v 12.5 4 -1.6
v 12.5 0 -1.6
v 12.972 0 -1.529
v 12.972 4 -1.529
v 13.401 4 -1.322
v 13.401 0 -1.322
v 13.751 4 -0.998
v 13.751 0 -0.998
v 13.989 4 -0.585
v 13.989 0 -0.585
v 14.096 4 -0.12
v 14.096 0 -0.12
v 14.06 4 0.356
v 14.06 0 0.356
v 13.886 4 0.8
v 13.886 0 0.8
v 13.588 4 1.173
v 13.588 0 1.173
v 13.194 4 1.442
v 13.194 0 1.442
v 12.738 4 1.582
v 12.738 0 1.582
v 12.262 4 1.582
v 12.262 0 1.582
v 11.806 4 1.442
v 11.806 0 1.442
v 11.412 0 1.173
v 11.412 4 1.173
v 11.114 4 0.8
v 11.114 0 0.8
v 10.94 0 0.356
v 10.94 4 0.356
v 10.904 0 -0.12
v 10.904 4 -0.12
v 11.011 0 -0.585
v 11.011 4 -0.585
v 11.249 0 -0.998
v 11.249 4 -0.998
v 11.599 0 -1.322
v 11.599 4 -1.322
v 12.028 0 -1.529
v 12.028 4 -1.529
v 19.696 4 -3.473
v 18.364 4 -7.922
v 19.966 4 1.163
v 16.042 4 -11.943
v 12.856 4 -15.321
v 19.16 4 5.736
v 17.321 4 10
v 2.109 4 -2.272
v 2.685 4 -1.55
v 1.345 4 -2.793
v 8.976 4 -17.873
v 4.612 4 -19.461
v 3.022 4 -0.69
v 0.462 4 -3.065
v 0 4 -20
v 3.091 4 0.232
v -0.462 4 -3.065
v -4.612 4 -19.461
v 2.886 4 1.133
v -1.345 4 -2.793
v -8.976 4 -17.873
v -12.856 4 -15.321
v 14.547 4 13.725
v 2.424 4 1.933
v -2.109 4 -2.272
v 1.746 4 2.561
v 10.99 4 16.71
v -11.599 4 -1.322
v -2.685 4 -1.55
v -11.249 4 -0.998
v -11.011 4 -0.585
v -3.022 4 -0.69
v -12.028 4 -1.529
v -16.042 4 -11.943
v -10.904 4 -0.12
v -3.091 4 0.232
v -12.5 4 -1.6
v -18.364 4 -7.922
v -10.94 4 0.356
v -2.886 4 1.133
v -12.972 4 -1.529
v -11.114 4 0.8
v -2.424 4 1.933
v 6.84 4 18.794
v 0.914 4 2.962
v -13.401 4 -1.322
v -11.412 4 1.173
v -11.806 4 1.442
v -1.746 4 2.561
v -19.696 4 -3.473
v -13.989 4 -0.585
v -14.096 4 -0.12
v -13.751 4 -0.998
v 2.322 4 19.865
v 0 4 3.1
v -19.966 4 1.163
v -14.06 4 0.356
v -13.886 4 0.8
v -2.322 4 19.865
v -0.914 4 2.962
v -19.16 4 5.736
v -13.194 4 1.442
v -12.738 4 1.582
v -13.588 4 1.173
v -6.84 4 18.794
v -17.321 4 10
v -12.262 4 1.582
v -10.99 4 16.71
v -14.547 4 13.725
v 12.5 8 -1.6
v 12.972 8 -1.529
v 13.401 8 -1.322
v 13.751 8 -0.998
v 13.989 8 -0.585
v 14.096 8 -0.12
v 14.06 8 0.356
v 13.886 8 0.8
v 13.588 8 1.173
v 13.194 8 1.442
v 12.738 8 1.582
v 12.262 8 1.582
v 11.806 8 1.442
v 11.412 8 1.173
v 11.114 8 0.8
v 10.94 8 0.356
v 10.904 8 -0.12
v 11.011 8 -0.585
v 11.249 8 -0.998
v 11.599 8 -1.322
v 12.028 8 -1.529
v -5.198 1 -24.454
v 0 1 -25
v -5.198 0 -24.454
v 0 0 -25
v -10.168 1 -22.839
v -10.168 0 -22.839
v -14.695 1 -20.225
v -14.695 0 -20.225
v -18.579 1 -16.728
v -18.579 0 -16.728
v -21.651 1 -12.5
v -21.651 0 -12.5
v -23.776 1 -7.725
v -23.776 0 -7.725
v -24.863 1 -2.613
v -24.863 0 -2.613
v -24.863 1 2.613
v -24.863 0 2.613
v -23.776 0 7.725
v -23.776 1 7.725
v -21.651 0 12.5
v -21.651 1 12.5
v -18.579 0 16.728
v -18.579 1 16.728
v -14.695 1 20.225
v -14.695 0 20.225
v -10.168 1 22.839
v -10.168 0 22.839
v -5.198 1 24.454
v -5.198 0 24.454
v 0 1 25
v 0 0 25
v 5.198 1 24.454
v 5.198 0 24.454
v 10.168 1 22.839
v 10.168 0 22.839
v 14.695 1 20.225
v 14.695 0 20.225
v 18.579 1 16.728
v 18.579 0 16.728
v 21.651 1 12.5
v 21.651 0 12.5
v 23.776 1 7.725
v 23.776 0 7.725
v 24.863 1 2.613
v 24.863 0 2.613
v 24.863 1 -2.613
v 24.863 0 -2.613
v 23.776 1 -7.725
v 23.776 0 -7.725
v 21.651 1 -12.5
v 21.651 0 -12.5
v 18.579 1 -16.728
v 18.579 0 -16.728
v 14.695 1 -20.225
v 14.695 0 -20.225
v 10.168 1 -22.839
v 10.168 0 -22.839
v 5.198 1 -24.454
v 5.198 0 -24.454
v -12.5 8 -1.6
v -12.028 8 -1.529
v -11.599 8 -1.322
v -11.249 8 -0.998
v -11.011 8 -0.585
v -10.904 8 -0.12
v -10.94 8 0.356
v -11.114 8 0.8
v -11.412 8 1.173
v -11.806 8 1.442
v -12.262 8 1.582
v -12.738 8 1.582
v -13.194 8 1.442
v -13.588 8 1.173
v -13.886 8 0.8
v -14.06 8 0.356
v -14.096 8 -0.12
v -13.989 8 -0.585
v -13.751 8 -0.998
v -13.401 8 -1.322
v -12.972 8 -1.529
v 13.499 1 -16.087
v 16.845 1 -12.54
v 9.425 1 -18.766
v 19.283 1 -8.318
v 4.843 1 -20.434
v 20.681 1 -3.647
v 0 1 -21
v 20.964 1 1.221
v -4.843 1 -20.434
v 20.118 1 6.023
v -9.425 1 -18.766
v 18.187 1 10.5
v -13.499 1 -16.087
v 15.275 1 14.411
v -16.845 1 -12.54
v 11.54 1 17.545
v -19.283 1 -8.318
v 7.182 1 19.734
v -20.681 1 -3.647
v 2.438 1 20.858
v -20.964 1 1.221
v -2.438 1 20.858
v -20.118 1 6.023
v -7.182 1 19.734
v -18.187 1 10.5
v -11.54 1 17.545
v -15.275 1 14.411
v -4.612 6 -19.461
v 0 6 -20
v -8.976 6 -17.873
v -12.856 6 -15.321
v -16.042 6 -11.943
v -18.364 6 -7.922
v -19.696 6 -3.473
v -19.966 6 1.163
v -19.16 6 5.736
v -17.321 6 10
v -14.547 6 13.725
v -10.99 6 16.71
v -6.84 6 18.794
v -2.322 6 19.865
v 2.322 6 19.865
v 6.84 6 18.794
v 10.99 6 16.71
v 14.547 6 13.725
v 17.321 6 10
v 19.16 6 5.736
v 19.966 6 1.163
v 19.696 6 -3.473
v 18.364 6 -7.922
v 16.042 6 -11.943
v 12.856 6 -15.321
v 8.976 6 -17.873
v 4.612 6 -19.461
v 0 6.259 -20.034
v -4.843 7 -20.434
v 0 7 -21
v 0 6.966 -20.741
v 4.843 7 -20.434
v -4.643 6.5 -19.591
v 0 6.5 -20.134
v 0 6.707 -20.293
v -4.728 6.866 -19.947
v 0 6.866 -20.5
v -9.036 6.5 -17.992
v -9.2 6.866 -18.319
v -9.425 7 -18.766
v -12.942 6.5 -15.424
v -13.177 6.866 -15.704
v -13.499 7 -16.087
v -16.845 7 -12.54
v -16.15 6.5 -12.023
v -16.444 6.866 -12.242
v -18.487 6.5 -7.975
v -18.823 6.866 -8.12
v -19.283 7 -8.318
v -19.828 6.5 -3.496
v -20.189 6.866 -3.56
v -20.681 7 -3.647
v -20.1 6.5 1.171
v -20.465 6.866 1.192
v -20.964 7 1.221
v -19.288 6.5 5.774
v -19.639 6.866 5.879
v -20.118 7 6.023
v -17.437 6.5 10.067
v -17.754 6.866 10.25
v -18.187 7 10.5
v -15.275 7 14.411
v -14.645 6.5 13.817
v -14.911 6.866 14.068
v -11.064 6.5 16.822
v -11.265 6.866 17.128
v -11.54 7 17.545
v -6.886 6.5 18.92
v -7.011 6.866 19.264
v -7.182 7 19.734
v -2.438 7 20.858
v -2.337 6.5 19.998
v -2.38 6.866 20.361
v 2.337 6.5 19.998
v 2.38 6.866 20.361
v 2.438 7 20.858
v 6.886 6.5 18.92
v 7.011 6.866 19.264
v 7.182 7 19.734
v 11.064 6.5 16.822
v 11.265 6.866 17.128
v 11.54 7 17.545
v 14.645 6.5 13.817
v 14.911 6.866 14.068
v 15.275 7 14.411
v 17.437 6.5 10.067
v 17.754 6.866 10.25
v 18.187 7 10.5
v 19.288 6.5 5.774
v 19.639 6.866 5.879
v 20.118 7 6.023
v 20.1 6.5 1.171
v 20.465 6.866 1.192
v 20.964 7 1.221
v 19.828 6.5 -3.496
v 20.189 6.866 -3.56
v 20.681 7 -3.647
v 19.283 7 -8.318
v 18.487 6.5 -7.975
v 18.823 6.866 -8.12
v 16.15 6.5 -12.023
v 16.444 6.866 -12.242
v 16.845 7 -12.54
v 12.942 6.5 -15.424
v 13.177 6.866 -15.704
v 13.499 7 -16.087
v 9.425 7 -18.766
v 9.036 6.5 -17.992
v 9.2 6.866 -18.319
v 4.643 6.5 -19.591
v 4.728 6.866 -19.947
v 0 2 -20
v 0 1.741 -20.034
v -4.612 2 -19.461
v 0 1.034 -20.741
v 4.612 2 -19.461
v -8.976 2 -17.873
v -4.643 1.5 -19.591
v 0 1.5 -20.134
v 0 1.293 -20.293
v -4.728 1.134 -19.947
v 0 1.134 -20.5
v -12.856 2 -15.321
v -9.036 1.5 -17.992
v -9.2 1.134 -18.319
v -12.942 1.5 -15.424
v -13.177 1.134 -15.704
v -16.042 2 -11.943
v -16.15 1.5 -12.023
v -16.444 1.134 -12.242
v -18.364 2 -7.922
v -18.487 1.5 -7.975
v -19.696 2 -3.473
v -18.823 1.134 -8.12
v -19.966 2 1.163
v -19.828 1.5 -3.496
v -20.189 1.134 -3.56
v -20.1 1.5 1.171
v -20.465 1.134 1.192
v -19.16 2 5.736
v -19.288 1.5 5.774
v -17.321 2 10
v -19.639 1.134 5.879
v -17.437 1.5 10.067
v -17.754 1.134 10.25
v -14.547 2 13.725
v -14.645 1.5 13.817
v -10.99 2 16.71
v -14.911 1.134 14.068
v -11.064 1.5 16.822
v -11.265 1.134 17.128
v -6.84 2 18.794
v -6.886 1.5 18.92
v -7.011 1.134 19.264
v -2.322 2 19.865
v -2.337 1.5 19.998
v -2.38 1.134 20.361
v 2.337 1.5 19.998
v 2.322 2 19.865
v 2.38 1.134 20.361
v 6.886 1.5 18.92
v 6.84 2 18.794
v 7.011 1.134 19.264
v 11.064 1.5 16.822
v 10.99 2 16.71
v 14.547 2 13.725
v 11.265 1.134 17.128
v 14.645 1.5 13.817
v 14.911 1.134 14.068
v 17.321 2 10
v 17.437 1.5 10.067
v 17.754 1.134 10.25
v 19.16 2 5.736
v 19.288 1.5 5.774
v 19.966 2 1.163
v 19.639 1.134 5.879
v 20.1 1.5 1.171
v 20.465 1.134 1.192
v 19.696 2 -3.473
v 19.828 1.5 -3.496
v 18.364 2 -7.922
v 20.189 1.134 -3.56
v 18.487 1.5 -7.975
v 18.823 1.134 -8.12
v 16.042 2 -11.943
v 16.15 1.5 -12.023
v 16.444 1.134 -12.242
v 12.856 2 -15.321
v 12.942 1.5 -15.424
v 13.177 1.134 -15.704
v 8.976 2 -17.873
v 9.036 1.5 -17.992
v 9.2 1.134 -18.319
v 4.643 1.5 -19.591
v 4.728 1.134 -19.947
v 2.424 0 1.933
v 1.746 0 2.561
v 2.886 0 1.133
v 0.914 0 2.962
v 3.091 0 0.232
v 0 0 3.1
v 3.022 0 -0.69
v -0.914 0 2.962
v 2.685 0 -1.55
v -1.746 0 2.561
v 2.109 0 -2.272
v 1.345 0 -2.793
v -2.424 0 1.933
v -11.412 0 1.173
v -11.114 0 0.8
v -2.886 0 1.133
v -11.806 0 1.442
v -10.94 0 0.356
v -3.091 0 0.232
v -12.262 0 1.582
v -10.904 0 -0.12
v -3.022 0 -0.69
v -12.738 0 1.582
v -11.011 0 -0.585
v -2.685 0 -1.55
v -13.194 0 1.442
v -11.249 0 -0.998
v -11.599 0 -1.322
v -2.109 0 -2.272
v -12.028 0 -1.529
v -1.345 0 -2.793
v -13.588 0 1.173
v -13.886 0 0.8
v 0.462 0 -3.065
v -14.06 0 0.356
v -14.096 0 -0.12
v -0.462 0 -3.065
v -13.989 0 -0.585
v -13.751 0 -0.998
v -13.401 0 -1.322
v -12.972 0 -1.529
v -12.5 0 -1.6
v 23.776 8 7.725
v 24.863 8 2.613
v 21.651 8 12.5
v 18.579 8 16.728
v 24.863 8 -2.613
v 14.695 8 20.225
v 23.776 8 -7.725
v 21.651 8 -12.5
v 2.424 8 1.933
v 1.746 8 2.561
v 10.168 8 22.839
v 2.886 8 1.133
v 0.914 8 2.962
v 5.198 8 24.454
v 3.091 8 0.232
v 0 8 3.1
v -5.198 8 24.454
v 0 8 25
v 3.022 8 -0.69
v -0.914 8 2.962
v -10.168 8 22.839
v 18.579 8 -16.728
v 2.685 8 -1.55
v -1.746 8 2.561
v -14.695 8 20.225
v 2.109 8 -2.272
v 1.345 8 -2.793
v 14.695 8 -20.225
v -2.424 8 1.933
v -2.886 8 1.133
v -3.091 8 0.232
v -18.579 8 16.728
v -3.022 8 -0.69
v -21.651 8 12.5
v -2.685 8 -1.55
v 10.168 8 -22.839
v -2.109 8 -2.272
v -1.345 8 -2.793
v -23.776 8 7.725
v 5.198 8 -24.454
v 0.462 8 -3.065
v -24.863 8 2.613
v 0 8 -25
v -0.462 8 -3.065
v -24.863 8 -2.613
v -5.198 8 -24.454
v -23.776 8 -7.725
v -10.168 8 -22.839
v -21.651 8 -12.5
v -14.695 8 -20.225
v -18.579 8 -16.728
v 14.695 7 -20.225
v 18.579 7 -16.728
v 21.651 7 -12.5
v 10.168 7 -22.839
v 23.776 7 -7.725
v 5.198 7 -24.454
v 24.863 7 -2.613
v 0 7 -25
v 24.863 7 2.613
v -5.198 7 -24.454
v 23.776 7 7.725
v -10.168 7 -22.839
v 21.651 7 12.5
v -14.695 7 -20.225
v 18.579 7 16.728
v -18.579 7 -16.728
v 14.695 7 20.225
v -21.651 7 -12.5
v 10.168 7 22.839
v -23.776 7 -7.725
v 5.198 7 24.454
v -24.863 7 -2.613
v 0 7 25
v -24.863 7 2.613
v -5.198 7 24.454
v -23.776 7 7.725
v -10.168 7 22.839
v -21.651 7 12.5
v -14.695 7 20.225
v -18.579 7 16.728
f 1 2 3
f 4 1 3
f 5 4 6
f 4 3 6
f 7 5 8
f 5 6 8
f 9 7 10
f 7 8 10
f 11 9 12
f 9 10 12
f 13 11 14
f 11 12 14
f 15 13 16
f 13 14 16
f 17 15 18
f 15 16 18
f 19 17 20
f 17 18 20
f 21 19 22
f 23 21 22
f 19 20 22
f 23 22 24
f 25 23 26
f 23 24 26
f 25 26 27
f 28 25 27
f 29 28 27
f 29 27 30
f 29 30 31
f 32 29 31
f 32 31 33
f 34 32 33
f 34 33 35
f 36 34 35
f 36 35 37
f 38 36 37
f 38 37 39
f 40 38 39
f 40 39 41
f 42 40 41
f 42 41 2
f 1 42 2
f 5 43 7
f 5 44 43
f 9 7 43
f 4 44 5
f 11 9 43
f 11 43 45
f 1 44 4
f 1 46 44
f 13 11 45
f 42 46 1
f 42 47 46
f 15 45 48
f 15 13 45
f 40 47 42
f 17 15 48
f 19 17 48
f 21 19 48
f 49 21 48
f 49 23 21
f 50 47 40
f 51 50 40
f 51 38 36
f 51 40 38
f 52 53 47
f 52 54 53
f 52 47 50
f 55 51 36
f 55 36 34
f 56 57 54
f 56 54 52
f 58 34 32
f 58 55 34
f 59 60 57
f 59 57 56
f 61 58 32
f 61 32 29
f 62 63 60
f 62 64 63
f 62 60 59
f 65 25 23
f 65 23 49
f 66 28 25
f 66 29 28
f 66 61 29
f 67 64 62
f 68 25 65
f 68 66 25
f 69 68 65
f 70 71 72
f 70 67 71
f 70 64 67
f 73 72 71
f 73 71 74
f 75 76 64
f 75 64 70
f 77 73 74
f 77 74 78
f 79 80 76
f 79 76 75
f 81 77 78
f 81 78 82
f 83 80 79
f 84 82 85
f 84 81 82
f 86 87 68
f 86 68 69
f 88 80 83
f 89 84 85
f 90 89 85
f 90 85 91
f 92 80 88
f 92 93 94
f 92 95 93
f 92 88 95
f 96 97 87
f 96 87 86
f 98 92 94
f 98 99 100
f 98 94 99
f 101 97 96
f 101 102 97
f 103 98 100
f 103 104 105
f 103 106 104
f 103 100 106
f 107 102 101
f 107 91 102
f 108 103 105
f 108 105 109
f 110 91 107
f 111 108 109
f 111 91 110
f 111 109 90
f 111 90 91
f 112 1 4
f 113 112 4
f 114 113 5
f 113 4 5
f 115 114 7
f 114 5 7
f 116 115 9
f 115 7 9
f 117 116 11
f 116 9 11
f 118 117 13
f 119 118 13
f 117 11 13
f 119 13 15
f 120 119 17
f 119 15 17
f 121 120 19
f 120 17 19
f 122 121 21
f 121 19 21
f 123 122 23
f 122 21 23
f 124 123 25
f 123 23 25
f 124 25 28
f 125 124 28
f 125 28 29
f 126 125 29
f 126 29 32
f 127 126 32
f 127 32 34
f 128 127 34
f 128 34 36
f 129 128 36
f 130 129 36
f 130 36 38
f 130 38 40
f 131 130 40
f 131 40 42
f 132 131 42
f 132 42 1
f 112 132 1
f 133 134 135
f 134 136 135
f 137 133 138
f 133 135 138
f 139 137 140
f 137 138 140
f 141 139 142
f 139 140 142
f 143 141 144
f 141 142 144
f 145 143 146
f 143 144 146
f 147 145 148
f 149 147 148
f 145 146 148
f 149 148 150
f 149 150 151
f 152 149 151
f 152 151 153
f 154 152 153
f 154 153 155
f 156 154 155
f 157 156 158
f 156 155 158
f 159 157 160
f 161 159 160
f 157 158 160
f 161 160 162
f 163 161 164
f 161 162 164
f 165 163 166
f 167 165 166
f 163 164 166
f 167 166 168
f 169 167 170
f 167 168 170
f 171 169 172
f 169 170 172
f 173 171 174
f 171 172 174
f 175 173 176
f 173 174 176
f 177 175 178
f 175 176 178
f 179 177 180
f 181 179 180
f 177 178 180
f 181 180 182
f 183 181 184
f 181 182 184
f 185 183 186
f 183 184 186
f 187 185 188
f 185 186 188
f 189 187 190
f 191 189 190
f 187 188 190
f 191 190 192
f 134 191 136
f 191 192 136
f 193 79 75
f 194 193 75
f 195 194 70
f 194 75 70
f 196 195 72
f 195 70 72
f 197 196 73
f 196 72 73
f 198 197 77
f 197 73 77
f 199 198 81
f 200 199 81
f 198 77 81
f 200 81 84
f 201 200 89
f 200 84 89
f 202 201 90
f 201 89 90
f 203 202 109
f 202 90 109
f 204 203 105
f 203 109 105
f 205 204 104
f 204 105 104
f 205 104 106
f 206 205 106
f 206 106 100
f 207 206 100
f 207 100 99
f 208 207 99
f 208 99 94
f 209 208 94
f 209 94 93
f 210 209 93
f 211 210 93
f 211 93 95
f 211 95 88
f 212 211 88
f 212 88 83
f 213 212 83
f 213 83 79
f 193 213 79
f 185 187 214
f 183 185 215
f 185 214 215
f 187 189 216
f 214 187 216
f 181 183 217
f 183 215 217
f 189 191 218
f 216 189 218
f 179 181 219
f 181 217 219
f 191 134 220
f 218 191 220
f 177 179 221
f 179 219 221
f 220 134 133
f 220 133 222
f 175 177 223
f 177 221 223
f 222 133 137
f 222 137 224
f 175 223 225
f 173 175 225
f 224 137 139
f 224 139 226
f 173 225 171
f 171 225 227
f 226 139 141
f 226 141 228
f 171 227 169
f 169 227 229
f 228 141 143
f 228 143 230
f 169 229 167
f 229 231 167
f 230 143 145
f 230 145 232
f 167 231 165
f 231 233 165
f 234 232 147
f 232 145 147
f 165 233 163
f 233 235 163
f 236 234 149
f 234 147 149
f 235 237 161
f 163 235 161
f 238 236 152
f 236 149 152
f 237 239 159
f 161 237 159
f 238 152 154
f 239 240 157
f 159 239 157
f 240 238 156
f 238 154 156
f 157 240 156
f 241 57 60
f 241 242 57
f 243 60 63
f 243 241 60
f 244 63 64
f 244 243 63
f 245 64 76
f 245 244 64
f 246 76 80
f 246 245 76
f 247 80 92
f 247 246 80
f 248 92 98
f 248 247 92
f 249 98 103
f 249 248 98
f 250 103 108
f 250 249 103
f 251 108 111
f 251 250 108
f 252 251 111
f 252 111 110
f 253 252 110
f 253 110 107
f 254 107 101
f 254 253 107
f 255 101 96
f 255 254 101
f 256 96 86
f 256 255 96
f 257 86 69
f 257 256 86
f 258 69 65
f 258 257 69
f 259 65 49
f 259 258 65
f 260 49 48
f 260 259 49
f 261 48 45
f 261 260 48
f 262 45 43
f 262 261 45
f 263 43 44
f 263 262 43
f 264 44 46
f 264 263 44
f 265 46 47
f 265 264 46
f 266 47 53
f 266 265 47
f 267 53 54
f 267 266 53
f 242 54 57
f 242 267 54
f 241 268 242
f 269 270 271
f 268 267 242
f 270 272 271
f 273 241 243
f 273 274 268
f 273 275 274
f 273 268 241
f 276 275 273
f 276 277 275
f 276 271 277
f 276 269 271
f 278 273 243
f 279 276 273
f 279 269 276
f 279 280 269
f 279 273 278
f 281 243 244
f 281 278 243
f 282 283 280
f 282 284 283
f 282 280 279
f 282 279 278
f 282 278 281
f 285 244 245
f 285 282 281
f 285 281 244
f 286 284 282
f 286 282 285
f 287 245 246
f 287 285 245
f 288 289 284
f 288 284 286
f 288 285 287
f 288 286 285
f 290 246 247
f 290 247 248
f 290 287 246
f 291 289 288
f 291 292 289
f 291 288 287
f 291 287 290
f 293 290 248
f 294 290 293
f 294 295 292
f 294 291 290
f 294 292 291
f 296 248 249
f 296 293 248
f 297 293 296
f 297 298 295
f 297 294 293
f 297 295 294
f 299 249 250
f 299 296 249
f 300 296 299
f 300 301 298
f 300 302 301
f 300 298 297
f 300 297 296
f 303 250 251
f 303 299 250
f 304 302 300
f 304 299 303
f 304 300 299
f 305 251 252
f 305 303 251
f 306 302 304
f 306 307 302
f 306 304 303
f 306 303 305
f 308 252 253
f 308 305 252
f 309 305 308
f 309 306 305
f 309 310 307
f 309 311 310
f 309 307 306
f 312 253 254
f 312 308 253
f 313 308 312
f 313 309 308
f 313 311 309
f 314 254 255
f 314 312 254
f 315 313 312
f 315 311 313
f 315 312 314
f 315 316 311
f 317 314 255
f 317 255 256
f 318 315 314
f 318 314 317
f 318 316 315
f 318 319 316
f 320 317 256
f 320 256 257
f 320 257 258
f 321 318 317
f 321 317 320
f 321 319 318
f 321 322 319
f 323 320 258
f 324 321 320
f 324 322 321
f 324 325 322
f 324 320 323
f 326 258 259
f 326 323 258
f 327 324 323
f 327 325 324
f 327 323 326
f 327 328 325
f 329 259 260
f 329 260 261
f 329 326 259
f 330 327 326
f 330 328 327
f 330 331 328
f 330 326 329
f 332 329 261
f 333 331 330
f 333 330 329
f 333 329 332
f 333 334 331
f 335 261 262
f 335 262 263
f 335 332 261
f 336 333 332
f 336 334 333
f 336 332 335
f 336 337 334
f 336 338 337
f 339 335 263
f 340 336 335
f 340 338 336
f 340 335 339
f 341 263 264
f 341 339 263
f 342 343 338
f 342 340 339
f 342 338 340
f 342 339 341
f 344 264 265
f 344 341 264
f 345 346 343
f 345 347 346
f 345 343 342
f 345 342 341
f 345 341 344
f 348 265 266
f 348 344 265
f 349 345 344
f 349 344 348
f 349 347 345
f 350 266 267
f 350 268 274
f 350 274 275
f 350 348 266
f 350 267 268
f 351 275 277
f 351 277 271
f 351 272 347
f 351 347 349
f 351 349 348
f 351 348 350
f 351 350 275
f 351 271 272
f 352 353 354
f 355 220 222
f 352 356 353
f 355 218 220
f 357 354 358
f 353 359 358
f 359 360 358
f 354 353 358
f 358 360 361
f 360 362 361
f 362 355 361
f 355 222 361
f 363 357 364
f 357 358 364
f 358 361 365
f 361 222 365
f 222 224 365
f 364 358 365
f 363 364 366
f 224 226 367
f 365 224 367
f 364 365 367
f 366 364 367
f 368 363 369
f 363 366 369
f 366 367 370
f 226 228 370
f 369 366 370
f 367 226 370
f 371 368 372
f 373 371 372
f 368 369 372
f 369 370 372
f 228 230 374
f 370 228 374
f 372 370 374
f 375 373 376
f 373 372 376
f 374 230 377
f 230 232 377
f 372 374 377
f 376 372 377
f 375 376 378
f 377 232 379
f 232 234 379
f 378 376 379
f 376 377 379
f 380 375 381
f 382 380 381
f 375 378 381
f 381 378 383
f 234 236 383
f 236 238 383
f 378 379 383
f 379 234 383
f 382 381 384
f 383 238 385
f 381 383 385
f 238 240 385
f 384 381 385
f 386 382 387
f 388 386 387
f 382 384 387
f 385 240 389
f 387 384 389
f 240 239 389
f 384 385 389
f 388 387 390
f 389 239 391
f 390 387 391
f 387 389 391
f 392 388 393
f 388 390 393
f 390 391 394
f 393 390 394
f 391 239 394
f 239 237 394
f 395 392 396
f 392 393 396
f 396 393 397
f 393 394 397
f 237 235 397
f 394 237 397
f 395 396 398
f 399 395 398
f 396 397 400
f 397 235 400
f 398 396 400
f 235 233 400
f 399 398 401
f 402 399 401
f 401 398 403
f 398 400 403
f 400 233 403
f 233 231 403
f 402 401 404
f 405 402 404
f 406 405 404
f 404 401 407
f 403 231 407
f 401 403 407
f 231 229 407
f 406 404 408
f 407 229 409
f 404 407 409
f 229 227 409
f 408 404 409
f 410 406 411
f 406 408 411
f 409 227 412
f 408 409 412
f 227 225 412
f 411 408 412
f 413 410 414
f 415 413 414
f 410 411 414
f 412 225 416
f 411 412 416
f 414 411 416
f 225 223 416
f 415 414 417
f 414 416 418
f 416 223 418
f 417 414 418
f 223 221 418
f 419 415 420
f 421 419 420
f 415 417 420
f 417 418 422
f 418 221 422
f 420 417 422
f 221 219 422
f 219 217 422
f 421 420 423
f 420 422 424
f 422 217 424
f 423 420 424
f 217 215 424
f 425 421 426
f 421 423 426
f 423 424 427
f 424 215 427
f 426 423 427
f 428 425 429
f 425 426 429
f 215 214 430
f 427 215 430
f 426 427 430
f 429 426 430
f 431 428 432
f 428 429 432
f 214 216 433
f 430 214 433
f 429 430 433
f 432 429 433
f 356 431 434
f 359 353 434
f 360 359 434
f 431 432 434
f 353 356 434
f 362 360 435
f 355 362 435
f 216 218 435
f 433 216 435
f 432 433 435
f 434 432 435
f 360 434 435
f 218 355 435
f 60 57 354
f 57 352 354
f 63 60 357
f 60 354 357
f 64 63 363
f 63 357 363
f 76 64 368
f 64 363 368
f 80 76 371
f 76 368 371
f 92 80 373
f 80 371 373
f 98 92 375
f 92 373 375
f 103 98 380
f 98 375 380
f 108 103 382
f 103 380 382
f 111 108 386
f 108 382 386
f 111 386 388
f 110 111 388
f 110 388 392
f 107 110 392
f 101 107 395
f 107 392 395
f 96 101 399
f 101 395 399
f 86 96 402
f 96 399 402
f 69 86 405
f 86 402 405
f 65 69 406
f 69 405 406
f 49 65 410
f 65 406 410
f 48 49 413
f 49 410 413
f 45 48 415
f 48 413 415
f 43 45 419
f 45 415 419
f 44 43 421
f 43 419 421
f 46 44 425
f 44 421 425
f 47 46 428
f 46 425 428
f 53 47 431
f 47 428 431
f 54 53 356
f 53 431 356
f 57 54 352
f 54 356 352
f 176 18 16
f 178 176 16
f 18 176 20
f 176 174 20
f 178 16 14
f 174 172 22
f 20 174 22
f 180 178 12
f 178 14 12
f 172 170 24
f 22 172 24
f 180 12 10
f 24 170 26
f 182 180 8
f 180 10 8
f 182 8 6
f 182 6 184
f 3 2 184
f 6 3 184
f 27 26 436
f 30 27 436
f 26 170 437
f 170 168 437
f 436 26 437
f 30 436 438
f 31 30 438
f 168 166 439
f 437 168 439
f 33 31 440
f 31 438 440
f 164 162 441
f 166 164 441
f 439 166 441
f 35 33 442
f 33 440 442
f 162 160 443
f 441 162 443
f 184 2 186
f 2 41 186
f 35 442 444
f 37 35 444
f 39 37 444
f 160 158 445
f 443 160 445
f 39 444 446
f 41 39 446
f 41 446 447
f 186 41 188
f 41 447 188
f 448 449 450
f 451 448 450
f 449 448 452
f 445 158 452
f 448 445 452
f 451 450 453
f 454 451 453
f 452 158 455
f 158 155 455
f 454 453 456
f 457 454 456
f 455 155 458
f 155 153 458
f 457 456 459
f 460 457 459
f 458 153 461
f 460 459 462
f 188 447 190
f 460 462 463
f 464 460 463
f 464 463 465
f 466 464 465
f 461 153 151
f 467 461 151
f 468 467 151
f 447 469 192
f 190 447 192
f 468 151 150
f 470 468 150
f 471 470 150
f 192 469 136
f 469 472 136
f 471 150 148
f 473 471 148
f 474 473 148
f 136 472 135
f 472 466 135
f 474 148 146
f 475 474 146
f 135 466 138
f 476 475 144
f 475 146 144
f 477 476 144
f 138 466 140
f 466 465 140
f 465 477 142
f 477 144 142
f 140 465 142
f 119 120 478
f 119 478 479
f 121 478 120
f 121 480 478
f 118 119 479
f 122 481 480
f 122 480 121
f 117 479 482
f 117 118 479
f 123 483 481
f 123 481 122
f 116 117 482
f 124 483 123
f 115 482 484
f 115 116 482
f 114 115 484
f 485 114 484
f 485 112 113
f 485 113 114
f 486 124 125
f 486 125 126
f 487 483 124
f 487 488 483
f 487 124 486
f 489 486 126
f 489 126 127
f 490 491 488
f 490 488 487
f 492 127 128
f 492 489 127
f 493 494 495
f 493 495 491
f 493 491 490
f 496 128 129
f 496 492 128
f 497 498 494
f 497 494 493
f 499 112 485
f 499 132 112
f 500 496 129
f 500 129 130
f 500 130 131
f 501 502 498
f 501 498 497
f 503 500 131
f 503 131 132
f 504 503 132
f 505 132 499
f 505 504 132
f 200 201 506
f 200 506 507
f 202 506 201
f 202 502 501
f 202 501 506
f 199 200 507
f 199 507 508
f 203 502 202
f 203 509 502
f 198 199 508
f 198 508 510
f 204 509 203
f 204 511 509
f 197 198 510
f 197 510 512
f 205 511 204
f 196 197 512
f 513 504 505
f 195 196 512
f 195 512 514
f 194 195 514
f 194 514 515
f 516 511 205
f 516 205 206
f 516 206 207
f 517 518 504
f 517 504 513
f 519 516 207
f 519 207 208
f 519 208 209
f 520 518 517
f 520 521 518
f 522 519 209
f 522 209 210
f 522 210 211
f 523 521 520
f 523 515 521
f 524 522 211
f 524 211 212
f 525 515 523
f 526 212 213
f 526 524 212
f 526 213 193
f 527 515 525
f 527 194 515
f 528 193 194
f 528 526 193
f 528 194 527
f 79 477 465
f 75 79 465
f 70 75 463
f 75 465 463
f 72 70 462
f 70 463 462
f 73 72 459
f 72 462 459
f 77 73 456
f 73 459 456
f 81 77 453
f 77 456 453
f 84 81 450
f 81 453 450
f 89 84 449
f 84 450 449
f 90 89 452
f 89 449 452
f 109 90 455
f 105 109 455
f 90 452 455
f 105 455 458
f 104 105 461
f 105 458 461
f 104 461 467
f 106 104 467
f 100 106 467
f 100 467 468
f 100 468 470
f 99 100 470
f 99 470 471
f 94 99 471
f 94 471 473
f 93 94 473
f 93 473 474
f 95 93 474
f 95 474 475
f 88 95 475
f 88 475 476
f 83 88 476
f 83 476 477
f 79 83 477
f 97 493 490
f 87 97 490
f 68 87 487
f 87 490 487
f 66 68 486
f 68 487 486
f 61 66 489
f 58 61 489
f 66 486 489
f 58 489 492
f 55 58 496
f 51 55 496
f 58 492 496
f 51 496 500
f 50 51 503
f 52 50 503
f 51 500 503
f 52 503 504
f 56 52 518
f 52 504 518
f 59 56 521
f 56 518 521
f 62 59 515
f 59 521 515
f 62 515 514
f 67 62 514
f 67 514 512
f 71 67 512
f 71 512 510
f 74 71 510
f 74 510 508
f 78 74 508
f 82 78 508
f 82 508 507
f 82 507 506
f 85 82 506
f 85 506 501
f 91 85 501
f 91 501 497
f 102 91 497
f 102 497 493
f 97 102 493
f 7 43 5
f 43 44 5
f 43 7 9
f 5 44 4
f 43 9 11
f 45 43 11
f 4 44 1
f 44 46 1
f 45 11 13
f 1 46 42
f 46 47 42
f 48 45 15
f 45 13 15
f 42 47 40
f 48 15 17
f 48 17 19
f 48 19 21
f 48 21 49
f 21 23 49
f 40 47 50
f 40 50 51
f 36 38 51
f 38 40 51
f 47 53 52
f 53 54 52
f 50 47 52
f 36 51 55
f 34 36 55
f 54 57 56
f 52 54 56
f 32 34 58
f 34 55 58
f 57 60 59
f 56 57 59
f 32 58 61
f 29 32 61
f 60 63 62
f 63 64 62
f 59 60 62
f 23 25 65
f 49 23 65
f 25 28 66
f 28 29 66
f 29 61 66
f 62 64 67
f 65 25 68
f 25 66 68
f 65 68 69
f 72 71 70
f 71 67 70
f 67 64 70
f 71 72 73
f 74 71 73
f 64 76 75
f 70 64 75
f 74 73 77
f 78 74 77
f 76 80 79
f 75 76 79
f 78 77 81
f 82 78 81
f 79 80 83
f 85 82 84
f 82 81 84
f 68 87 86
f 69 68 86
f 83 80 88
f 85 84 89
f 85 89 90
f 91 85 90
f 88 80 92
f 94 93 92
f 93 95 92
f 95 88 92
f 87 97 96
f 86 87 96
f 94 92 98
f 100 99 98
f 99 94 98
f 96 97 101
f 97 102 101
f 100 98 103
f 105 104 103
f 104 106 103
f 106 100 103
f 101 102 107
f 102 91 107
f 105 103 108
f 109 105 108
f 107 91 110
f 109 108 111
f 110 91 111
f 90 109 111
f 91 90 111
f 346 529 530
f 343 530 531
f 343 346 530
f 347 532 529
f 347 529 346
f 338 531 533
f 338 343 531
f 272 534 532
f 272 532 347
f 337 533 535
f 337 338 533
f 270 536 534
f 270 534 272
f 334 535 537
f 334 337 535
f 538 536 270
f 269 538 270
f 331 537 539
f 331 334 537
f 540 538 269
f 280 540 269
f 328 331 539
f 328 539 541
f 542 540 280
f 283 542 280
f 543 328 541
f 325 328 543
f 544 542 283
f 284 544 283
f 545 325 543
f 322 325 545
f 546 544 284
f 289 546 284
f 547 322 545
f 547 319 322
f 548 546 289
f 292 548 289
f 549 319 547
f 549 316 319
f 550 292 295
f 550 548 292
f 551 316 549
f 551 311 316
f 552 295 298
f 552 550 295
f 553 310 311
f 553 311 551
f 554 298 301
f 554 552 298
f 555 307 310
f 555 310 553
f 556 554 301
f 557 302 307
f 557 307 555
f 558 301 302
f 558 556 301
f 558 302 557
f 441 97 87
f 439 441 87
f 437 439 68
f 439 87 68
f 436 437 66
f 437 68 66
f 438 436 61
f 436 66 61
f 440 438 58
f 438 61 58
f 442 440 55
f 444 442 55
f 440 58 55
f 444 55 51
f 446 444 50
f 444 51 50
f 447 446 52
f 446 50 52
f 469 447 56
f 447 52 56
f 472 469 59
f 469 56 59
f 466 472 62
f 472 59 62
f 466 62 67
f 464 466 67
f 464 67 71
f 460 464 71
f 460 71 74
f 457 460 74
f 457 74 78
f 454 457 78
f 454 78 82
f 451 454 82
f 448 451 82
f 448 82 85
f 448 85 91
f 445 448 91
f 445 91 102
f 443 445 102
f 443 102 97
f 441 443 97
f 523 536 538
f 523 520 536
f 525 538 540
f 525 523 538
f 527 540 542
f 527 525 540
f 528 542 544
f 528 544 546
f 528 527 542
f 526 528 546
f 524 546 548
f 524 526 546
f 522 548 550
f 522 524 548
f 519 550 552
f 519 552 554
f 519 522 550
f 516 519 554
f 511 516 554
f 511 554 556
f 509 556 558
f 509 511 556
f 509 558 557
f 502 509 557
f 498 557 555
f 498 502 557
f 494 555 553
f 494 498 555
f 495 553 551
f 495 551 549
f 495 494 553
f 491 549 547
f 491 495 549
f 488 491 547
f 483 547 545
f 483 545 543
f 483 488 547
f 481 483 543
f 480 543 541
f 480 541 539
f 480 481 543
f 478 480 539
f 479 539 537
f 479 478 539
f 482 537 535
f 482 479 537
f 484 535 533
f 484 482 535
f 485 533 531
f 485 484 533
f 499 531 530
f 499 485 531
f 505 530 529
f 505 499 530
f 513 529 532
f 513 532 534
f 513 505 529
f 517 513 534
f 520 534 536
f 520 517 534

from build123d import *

# Parameters (mm, degrees)
SKETCH_2_R          = 3.1
CUT_EXTRUDE_1_DEPTH = 37.249137921
SKETCH_3_R          = 1.6
CUT_EXTRUDE_2_DEPTH = 37.249137921


with BuildPart() as part:
    # ｽｹｯﾁ1 → 回転1 (revolve)
    with BuildSketch(Plane.XY, mode=Mode.PRIVATE) as revolve_1_sk:
        with BuildLine():
            Line((0, 0), (0, 4))
            Line((0, 4), (20, 4))
            Line((20, 4), (20, 2))
            ThreePointArc((20, 2), (20.292893219, 1.292893219), (21, 1))
            Line((21, 1), (25, 1))
            Line((25, 1), (25, 0))
            Line((25, 0), (0, 0))
        make_face()
    revolve(revolve_1_sk.sketch.rotate(Axis((0, 0, 0), (0, 1, 0)), 90), axis=Axis((0, 0, 0), (0, 1, 0)))


with BuildPart() as body_2:
    # ﾐﾗｰ1: mirrored copy
    add(part.part.mirror(Plane.ZX.offset(4)))


with BuildPart() as cut_extrude_1_tool:
    # ｽｹｯﾁ2 → ｶｯﾄ - 押し出し1 (new, through all)
    with BuildSketch(Plane(origin=(0, 8, 0), x_dir=(1, 0, 0), z_dir=(0, 1, 0))):
        with Locations(Location((0, 0, 0), (0, 0, 270))):
            Circle(SKETCH_2_R)
    extrude(amount=-CUT_EXTRUDE_1_DEPTH)


with BuildPart() as part_1:
    add(part.part)

    # ｶｯﾄ - 押し出し1: cut by cut_extrude_1_tool
    add(cut_extrude_1_tool.part, mode=Mode.SUBTRACT)


with BuildPart() as body_2_1:
    add(body_2.part)

    # ｶｯﾄ - 押し出し1: cut by cut_extrude_1_tool
    add(cut_extrude_1_tool.part, mode=Mode.SUBTRACT)


with BuildPart() as cut_extrude_2_tool:
    # ｽｹｯﾁ3 → ｶｯﾄ - 押し出し2 (new, through all)
    with BuildSketch(Plane.XZ):
        with Locations(Location((12.5, 0, 0), (0, 0, 270))):
            Circle(SKETCH_3_R)
        with Locations(Location((-12.5, 0, 0), (0, 0, 270))):
            Circle(SKETCH_3_R)
    extrude(amount=-CUT_EXTRUDE_2_DEPTH)


with BuildPart() as part_2:
    add(part_1.part)

    # ｶｯﾄ - 押し出し2: cut by cut_extrude_2_tool
    add(cut_extrude_2_tool.part, mode=Mode.SUBTRACT)


with BuildPart() as body_2_2:
    add(body_2_1.part)

    # ｶｯﾄ - 押し出し2: cut by cut_extrude_2_tool
    add(cut_extrude_2_tool.part, mode=Mode.SUBTRACT)


solid = Compound([part_2.part, body_2_2.part])
